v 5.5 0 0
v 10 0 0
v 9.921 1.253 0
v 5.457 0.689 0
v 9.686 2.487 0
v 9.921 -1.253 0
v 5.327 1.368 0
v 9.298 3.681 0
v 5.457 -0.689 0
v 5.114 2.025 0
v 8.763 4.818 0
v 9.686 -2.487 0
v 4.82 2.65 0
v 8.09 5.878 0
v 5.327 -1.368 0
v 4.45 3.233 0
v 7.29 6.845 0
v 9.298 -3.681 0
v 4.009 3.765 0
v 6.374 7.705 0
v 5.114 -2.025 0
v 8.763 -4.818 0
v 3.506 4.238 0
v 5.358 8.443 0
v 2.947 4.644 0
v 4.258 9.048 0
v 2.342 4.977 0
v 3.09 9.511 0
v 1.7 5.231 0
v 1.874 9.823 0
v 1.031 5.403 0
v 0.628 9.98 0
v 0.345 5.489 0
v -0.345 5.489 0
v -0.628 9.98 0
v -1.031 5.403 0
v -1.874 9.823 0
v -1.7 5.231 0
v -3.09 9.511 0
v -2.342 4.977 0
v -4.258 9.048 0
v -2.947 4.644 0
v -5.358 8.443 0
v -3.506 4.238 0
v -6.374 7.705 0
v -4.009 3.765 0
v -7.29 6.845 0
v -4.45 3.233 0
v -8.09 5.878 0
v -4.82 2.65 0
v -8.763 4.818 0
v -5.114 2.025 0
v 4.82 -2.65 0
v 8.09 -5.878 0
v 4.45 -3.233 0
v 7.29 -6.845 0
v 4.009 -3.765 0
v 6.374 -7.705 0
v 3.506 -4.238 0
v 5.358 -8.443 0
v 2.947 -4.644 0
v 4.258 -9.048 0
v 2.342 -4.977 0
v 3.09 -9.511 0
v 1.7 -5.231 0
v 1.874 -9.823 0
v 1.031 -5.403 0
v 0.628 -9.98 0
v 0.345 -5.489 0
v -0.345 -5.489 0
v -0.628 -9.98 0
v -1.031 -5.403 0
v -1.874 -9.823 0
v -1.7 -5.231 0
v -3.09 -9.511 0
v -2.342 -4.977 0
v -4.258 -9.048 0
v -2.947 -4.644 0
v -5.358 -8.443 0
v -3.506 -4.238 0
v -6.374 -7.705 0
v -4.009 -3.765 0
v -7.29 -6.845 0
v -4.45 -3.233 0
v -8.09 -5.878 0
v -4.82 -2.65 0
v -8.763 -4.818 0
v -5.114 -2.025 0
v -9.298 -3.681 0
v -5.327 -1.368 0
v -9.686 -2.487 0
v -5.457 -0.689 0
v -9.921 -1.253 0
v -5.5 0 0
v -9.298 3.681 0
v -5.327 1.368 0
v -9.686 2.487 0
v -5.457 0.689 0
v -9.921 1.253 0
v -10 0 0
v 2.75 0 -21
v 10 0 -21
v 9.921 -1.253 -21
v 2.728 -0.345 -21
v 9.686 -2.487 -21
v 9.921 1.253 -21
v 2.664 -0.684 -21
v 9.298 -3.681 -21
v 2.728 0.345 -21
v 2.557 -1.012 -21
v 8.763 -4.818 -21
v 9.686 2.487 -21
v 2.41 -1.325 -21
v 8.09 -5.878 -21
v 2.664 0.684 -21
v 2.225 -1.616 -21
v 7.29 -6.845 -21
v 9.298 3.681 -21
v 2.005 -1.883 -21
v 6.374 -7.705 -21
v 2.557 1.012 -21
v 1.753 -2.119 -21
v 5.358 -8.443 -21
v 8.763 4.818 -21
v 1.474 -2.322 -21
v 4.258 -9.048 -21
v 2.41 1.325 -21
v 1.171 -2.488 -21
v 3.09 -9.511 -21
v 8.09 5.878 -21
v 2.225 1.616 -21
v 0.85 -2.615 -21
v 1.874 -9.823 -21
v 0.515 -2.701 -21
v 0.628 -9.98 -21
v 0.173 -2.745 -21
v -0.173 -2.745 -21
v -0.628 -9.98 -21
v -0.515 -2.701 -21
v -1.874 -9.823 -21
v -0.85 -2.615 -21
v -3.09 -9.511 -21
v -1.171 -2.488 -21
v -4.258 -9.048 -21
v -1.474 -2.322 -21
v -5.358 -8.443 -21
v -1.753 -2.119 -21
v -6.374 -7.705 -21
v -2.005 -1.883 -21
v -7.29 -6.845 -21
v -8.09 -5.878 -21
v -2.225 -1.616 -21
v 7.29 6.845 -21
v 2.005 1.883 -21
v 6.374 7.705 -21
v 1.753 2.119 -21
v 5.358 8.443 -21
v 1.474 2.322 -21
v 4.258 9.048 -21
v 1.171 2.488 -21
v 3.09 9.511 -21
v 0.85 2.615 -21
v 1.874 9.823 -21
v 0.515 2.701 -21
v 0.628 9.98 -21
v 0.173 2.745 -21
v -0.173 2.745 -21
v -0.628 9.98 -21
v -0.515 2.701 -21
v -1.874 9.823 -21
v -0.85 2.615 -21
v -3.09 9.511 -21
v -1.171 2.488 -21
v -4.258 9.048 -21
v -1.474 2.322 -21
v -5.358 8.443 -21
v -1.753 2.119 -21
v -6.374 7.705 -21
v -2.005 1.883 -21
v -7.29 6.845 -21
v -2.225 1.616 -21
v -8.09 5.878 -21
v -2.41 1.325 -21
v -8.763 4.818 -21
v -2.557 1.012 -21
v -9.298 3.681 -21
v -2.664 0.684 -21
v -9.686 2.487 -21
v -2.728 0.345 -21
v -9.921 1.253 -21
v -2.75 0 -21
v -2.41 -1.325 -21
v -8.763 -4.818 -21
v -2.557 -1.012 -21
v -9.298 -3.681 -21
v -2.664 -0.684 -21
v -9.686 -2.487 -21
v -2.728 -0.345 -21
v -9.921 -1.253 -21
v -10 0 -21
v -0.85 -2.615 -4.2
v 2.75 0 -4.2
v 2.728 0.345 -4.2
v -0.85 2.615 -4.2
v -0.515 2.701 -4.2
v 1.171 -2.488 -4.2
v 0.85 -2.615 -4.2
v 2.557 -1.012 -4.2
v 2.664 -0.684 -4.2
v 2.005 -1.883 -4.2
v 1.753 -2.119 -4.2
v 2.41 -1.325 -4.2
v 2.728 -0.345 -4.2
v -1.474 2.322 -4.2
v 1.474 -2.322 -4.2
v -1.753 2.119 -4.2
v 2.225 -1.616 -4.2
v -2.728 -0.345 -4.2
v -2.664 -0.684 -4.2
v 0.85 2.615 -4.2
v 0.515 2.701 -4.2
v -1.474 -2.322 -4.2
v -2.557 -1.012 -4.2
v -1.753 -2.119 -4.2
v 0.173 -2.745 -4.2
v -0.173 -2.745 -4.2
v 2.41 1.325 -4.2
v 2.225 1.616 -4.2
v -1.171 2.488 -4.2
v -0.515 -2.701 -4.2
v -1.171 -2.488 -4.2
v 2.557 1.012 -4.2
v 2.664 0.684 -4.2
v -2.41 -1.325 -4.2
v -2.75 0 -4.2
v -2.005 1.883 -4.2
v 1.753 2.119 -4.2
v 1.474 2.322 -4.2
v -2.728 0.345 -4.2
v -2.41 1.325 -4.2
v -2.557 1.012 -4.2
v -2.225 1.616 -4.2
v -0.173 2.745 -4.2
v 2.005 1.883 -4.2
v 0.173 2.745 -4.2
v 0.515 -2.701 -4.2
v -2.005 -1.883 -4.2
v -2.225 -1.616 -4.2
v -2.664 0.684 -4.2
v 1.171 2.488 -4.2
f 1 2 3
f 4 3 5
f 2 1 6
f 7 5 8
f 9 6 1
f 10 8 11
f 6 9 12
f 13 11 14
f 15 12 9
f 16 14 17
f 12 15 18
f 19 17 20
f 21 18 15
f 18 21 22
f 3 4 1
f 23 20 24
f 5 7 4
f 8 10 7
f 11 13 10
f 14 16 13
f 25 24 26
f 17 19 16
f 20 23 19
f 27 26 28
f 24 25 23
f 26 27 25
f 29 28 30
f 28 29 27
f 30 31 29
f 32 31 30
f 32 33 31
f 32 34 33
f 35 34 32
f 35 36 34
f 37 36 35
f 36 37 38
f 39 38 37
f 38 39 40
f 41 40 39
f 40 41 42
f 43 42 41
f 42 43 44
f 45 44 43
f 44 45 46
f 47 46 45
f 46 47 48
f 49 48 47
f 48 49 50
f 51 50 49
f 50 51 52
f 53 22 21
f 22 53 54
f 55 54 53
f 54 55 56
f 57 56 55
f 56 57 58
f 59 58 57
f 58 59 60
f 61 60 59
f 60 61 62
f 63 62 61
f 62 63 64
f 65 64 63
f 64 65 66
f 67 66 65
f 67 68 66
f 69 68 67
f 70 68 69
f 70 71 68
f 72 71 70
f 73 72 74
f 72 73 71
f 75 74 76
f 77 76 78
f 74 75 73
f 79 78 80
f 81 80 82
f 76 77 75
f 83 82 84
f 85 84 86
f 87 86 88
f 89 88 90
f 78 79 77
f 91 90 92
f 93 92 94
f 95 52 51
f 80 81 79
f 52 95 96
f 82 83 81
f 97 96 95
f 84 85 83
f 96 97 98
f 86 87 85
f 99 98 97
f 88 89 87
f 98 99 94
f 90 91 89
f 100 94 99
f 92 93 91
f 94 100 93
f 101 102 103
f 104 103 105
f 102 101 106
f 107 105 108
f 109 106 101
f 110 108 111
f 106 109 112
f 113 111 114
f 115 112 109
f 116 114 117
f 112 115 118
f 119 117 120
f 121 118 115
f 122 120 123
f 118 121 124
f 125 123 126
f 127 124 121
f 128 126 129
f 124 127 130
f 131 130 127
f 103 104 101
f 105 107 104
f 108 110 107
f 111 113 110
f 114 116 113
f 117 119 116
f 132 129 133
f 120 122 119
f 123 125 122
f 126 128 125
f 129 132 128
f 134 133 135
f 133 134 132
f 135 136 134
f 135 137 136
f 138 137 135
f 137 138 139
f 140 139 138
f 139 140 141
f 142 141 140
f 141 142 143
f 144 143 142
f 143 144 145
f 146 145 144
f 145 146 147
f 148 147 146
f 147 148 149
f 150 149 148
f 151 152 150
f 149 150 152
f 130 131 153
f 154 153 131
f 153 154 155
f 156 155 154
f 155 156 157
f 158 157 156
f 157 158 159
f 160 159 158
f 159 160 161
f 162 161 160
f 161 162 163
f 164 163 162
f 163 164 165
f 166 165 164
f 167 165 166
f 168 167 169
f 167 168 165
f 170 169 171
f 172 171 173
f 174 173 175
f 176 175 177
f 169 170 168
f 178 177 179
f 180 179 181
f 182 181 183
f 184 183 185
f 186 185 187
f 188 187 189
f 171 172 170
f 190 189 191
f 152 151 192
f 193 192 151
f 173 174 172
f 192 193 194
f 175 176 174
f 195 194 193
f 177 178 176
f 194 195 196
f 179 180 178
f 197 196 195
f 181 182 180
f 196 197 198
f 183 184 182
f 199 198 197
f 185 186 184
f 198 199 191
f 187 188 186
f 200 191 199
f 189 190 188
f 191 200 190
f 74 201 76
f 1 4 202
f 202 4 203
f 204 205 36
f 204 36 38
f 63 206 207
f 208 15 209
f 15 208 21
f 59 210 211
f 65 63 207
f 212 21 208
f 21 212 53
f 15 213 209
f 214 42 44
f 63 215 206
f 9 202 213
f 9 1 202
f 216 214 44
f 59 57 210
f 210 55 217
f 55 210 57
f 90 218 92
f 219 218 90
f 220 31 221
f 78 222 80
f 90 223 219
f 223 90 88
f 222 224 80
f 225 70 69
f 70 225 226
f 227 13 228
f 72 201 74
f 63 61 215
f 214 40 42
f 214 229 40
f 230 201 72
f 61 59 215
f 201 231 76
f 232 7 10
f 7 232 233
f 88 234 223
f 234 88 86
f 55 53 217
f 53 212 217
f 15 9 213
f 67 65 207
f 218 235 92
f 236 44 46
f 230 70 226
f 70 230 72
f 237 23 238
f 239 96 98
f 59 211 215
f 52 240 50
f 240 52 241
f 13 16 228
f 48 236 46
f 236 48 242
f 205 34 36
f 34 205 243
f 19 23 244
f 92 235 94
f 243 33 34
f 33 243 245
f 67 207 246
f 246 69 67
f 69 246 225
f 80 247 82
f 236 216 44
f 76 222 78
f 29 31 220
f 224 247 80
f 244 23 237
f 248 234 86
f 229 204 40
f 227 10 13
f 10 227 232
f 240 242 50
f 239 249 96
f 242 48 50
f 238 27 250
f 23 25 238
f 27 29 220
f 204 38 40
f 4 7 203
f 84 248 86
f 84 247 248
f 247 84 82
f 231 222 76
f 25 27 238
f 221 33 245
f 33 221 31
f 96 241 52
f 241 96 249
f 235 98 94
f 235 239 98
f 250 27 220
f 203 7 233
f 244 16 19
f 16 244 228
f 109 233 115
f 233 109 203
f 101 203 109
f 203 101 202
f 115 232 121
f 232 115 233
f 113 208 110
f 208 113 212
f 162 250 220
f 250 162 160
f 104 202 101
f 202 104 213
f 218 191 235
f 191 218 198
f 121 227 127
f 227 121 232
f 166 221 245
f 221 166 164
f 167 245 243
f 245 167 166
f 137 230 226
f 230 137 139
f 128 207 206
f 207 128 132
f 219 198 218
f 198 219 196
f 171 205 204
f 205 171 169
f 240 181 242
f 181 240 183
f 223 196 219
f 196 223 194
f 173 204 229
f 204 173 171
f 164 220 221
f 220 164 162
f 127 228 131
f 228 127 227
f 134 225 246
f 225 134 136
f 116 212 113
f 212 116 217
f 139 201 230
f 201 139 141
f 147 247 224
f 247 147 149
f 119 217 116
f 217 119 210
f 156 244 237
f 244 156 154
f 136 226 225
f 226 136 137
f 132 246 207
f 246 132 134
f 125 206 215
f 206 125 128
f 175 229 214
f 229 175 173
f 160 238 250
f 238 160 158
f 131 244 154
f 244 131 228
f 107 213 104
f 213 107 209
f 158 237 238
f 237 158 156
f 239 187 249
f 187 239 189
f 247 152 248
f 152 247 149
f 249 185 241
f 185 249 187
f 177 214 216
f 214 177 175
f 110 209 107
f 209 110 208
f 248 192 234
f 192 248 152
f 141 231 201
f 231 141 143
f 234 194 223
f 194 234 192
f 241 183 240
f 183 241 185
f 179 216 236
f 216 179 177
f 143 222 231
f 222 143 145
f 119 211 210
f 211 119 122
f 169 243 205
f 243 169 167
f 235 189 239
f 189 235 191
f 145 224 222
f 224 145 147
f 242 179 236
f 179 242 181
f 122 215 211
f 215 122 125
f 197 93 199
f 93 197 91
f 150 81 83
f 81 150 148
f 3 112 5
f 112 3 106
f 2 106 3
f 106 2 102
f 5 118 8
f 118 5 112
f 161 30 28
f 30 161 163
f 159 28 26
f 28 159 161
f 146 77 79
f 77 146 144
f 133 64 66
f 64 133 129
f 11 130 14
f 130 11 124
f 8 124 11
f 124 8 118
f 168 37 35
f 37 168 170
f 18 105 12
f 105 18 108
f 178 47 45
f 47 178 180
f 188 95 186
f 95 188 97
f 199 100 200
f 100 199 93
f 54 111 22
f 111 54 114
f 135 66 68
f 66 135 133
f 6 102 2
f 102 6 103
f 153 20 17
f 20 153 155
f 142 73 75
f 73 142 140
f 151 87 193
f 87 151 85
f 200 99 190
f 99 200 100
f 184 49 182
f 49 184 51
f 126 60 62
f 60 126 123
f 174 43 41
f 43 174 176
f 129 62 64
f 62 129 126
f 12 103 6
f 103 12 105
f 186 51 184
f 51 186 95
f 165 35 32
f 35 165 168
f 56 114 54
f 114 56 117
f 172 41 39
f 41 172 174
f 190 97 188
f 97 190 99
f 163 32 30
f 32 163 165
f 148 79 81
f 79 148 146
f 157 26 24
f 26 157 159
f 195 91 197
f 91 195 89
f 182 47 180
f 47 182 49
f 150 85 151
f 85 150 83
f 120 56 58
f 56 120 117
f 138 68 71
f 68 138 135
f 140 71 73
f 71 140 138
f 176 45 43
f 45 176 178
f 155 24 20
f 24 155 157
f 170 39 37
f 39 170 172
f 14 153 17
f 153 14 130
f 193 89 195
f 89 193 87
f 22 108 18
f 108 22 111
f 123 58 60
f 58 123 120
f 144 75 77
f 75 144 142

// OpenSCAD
$fn = 50;


difference() {
	union() {
		translate(v = [0, 0, -21.0000000000]) {
			cylinder(h = 21, r = 10.0000000000);
		}
		cylinder(h = 0, r = 19.0000000000);
	}
	union() {
		translate(v = [0, 0, 0]) {
			rotate(a = [0, 0, 0]) {
				difference() {
					union() {
						#translate(v = [0, 0, -21.0000000000]) {
							cylinder(h = 21, r = 2.2500000000);
						}
						#translate(v = [0, 0, -4.2000000000]) {
							cylinder(h = 4.2000000000, r = 10.0000000000, r1 = 2.7500000000, r2 = 5.5000000000);
						}
						#translate(v = [0, 0, -21.0000000000]) {
							cylinder(h = 21, r = 2.7500000000);
						}
						#translate(v = [0, 0, -21.0000000000]) {
							cylinder(h = 21, r = 2.2500000000);
						}
					}
					union();
				}
			}
		}
	}
}
